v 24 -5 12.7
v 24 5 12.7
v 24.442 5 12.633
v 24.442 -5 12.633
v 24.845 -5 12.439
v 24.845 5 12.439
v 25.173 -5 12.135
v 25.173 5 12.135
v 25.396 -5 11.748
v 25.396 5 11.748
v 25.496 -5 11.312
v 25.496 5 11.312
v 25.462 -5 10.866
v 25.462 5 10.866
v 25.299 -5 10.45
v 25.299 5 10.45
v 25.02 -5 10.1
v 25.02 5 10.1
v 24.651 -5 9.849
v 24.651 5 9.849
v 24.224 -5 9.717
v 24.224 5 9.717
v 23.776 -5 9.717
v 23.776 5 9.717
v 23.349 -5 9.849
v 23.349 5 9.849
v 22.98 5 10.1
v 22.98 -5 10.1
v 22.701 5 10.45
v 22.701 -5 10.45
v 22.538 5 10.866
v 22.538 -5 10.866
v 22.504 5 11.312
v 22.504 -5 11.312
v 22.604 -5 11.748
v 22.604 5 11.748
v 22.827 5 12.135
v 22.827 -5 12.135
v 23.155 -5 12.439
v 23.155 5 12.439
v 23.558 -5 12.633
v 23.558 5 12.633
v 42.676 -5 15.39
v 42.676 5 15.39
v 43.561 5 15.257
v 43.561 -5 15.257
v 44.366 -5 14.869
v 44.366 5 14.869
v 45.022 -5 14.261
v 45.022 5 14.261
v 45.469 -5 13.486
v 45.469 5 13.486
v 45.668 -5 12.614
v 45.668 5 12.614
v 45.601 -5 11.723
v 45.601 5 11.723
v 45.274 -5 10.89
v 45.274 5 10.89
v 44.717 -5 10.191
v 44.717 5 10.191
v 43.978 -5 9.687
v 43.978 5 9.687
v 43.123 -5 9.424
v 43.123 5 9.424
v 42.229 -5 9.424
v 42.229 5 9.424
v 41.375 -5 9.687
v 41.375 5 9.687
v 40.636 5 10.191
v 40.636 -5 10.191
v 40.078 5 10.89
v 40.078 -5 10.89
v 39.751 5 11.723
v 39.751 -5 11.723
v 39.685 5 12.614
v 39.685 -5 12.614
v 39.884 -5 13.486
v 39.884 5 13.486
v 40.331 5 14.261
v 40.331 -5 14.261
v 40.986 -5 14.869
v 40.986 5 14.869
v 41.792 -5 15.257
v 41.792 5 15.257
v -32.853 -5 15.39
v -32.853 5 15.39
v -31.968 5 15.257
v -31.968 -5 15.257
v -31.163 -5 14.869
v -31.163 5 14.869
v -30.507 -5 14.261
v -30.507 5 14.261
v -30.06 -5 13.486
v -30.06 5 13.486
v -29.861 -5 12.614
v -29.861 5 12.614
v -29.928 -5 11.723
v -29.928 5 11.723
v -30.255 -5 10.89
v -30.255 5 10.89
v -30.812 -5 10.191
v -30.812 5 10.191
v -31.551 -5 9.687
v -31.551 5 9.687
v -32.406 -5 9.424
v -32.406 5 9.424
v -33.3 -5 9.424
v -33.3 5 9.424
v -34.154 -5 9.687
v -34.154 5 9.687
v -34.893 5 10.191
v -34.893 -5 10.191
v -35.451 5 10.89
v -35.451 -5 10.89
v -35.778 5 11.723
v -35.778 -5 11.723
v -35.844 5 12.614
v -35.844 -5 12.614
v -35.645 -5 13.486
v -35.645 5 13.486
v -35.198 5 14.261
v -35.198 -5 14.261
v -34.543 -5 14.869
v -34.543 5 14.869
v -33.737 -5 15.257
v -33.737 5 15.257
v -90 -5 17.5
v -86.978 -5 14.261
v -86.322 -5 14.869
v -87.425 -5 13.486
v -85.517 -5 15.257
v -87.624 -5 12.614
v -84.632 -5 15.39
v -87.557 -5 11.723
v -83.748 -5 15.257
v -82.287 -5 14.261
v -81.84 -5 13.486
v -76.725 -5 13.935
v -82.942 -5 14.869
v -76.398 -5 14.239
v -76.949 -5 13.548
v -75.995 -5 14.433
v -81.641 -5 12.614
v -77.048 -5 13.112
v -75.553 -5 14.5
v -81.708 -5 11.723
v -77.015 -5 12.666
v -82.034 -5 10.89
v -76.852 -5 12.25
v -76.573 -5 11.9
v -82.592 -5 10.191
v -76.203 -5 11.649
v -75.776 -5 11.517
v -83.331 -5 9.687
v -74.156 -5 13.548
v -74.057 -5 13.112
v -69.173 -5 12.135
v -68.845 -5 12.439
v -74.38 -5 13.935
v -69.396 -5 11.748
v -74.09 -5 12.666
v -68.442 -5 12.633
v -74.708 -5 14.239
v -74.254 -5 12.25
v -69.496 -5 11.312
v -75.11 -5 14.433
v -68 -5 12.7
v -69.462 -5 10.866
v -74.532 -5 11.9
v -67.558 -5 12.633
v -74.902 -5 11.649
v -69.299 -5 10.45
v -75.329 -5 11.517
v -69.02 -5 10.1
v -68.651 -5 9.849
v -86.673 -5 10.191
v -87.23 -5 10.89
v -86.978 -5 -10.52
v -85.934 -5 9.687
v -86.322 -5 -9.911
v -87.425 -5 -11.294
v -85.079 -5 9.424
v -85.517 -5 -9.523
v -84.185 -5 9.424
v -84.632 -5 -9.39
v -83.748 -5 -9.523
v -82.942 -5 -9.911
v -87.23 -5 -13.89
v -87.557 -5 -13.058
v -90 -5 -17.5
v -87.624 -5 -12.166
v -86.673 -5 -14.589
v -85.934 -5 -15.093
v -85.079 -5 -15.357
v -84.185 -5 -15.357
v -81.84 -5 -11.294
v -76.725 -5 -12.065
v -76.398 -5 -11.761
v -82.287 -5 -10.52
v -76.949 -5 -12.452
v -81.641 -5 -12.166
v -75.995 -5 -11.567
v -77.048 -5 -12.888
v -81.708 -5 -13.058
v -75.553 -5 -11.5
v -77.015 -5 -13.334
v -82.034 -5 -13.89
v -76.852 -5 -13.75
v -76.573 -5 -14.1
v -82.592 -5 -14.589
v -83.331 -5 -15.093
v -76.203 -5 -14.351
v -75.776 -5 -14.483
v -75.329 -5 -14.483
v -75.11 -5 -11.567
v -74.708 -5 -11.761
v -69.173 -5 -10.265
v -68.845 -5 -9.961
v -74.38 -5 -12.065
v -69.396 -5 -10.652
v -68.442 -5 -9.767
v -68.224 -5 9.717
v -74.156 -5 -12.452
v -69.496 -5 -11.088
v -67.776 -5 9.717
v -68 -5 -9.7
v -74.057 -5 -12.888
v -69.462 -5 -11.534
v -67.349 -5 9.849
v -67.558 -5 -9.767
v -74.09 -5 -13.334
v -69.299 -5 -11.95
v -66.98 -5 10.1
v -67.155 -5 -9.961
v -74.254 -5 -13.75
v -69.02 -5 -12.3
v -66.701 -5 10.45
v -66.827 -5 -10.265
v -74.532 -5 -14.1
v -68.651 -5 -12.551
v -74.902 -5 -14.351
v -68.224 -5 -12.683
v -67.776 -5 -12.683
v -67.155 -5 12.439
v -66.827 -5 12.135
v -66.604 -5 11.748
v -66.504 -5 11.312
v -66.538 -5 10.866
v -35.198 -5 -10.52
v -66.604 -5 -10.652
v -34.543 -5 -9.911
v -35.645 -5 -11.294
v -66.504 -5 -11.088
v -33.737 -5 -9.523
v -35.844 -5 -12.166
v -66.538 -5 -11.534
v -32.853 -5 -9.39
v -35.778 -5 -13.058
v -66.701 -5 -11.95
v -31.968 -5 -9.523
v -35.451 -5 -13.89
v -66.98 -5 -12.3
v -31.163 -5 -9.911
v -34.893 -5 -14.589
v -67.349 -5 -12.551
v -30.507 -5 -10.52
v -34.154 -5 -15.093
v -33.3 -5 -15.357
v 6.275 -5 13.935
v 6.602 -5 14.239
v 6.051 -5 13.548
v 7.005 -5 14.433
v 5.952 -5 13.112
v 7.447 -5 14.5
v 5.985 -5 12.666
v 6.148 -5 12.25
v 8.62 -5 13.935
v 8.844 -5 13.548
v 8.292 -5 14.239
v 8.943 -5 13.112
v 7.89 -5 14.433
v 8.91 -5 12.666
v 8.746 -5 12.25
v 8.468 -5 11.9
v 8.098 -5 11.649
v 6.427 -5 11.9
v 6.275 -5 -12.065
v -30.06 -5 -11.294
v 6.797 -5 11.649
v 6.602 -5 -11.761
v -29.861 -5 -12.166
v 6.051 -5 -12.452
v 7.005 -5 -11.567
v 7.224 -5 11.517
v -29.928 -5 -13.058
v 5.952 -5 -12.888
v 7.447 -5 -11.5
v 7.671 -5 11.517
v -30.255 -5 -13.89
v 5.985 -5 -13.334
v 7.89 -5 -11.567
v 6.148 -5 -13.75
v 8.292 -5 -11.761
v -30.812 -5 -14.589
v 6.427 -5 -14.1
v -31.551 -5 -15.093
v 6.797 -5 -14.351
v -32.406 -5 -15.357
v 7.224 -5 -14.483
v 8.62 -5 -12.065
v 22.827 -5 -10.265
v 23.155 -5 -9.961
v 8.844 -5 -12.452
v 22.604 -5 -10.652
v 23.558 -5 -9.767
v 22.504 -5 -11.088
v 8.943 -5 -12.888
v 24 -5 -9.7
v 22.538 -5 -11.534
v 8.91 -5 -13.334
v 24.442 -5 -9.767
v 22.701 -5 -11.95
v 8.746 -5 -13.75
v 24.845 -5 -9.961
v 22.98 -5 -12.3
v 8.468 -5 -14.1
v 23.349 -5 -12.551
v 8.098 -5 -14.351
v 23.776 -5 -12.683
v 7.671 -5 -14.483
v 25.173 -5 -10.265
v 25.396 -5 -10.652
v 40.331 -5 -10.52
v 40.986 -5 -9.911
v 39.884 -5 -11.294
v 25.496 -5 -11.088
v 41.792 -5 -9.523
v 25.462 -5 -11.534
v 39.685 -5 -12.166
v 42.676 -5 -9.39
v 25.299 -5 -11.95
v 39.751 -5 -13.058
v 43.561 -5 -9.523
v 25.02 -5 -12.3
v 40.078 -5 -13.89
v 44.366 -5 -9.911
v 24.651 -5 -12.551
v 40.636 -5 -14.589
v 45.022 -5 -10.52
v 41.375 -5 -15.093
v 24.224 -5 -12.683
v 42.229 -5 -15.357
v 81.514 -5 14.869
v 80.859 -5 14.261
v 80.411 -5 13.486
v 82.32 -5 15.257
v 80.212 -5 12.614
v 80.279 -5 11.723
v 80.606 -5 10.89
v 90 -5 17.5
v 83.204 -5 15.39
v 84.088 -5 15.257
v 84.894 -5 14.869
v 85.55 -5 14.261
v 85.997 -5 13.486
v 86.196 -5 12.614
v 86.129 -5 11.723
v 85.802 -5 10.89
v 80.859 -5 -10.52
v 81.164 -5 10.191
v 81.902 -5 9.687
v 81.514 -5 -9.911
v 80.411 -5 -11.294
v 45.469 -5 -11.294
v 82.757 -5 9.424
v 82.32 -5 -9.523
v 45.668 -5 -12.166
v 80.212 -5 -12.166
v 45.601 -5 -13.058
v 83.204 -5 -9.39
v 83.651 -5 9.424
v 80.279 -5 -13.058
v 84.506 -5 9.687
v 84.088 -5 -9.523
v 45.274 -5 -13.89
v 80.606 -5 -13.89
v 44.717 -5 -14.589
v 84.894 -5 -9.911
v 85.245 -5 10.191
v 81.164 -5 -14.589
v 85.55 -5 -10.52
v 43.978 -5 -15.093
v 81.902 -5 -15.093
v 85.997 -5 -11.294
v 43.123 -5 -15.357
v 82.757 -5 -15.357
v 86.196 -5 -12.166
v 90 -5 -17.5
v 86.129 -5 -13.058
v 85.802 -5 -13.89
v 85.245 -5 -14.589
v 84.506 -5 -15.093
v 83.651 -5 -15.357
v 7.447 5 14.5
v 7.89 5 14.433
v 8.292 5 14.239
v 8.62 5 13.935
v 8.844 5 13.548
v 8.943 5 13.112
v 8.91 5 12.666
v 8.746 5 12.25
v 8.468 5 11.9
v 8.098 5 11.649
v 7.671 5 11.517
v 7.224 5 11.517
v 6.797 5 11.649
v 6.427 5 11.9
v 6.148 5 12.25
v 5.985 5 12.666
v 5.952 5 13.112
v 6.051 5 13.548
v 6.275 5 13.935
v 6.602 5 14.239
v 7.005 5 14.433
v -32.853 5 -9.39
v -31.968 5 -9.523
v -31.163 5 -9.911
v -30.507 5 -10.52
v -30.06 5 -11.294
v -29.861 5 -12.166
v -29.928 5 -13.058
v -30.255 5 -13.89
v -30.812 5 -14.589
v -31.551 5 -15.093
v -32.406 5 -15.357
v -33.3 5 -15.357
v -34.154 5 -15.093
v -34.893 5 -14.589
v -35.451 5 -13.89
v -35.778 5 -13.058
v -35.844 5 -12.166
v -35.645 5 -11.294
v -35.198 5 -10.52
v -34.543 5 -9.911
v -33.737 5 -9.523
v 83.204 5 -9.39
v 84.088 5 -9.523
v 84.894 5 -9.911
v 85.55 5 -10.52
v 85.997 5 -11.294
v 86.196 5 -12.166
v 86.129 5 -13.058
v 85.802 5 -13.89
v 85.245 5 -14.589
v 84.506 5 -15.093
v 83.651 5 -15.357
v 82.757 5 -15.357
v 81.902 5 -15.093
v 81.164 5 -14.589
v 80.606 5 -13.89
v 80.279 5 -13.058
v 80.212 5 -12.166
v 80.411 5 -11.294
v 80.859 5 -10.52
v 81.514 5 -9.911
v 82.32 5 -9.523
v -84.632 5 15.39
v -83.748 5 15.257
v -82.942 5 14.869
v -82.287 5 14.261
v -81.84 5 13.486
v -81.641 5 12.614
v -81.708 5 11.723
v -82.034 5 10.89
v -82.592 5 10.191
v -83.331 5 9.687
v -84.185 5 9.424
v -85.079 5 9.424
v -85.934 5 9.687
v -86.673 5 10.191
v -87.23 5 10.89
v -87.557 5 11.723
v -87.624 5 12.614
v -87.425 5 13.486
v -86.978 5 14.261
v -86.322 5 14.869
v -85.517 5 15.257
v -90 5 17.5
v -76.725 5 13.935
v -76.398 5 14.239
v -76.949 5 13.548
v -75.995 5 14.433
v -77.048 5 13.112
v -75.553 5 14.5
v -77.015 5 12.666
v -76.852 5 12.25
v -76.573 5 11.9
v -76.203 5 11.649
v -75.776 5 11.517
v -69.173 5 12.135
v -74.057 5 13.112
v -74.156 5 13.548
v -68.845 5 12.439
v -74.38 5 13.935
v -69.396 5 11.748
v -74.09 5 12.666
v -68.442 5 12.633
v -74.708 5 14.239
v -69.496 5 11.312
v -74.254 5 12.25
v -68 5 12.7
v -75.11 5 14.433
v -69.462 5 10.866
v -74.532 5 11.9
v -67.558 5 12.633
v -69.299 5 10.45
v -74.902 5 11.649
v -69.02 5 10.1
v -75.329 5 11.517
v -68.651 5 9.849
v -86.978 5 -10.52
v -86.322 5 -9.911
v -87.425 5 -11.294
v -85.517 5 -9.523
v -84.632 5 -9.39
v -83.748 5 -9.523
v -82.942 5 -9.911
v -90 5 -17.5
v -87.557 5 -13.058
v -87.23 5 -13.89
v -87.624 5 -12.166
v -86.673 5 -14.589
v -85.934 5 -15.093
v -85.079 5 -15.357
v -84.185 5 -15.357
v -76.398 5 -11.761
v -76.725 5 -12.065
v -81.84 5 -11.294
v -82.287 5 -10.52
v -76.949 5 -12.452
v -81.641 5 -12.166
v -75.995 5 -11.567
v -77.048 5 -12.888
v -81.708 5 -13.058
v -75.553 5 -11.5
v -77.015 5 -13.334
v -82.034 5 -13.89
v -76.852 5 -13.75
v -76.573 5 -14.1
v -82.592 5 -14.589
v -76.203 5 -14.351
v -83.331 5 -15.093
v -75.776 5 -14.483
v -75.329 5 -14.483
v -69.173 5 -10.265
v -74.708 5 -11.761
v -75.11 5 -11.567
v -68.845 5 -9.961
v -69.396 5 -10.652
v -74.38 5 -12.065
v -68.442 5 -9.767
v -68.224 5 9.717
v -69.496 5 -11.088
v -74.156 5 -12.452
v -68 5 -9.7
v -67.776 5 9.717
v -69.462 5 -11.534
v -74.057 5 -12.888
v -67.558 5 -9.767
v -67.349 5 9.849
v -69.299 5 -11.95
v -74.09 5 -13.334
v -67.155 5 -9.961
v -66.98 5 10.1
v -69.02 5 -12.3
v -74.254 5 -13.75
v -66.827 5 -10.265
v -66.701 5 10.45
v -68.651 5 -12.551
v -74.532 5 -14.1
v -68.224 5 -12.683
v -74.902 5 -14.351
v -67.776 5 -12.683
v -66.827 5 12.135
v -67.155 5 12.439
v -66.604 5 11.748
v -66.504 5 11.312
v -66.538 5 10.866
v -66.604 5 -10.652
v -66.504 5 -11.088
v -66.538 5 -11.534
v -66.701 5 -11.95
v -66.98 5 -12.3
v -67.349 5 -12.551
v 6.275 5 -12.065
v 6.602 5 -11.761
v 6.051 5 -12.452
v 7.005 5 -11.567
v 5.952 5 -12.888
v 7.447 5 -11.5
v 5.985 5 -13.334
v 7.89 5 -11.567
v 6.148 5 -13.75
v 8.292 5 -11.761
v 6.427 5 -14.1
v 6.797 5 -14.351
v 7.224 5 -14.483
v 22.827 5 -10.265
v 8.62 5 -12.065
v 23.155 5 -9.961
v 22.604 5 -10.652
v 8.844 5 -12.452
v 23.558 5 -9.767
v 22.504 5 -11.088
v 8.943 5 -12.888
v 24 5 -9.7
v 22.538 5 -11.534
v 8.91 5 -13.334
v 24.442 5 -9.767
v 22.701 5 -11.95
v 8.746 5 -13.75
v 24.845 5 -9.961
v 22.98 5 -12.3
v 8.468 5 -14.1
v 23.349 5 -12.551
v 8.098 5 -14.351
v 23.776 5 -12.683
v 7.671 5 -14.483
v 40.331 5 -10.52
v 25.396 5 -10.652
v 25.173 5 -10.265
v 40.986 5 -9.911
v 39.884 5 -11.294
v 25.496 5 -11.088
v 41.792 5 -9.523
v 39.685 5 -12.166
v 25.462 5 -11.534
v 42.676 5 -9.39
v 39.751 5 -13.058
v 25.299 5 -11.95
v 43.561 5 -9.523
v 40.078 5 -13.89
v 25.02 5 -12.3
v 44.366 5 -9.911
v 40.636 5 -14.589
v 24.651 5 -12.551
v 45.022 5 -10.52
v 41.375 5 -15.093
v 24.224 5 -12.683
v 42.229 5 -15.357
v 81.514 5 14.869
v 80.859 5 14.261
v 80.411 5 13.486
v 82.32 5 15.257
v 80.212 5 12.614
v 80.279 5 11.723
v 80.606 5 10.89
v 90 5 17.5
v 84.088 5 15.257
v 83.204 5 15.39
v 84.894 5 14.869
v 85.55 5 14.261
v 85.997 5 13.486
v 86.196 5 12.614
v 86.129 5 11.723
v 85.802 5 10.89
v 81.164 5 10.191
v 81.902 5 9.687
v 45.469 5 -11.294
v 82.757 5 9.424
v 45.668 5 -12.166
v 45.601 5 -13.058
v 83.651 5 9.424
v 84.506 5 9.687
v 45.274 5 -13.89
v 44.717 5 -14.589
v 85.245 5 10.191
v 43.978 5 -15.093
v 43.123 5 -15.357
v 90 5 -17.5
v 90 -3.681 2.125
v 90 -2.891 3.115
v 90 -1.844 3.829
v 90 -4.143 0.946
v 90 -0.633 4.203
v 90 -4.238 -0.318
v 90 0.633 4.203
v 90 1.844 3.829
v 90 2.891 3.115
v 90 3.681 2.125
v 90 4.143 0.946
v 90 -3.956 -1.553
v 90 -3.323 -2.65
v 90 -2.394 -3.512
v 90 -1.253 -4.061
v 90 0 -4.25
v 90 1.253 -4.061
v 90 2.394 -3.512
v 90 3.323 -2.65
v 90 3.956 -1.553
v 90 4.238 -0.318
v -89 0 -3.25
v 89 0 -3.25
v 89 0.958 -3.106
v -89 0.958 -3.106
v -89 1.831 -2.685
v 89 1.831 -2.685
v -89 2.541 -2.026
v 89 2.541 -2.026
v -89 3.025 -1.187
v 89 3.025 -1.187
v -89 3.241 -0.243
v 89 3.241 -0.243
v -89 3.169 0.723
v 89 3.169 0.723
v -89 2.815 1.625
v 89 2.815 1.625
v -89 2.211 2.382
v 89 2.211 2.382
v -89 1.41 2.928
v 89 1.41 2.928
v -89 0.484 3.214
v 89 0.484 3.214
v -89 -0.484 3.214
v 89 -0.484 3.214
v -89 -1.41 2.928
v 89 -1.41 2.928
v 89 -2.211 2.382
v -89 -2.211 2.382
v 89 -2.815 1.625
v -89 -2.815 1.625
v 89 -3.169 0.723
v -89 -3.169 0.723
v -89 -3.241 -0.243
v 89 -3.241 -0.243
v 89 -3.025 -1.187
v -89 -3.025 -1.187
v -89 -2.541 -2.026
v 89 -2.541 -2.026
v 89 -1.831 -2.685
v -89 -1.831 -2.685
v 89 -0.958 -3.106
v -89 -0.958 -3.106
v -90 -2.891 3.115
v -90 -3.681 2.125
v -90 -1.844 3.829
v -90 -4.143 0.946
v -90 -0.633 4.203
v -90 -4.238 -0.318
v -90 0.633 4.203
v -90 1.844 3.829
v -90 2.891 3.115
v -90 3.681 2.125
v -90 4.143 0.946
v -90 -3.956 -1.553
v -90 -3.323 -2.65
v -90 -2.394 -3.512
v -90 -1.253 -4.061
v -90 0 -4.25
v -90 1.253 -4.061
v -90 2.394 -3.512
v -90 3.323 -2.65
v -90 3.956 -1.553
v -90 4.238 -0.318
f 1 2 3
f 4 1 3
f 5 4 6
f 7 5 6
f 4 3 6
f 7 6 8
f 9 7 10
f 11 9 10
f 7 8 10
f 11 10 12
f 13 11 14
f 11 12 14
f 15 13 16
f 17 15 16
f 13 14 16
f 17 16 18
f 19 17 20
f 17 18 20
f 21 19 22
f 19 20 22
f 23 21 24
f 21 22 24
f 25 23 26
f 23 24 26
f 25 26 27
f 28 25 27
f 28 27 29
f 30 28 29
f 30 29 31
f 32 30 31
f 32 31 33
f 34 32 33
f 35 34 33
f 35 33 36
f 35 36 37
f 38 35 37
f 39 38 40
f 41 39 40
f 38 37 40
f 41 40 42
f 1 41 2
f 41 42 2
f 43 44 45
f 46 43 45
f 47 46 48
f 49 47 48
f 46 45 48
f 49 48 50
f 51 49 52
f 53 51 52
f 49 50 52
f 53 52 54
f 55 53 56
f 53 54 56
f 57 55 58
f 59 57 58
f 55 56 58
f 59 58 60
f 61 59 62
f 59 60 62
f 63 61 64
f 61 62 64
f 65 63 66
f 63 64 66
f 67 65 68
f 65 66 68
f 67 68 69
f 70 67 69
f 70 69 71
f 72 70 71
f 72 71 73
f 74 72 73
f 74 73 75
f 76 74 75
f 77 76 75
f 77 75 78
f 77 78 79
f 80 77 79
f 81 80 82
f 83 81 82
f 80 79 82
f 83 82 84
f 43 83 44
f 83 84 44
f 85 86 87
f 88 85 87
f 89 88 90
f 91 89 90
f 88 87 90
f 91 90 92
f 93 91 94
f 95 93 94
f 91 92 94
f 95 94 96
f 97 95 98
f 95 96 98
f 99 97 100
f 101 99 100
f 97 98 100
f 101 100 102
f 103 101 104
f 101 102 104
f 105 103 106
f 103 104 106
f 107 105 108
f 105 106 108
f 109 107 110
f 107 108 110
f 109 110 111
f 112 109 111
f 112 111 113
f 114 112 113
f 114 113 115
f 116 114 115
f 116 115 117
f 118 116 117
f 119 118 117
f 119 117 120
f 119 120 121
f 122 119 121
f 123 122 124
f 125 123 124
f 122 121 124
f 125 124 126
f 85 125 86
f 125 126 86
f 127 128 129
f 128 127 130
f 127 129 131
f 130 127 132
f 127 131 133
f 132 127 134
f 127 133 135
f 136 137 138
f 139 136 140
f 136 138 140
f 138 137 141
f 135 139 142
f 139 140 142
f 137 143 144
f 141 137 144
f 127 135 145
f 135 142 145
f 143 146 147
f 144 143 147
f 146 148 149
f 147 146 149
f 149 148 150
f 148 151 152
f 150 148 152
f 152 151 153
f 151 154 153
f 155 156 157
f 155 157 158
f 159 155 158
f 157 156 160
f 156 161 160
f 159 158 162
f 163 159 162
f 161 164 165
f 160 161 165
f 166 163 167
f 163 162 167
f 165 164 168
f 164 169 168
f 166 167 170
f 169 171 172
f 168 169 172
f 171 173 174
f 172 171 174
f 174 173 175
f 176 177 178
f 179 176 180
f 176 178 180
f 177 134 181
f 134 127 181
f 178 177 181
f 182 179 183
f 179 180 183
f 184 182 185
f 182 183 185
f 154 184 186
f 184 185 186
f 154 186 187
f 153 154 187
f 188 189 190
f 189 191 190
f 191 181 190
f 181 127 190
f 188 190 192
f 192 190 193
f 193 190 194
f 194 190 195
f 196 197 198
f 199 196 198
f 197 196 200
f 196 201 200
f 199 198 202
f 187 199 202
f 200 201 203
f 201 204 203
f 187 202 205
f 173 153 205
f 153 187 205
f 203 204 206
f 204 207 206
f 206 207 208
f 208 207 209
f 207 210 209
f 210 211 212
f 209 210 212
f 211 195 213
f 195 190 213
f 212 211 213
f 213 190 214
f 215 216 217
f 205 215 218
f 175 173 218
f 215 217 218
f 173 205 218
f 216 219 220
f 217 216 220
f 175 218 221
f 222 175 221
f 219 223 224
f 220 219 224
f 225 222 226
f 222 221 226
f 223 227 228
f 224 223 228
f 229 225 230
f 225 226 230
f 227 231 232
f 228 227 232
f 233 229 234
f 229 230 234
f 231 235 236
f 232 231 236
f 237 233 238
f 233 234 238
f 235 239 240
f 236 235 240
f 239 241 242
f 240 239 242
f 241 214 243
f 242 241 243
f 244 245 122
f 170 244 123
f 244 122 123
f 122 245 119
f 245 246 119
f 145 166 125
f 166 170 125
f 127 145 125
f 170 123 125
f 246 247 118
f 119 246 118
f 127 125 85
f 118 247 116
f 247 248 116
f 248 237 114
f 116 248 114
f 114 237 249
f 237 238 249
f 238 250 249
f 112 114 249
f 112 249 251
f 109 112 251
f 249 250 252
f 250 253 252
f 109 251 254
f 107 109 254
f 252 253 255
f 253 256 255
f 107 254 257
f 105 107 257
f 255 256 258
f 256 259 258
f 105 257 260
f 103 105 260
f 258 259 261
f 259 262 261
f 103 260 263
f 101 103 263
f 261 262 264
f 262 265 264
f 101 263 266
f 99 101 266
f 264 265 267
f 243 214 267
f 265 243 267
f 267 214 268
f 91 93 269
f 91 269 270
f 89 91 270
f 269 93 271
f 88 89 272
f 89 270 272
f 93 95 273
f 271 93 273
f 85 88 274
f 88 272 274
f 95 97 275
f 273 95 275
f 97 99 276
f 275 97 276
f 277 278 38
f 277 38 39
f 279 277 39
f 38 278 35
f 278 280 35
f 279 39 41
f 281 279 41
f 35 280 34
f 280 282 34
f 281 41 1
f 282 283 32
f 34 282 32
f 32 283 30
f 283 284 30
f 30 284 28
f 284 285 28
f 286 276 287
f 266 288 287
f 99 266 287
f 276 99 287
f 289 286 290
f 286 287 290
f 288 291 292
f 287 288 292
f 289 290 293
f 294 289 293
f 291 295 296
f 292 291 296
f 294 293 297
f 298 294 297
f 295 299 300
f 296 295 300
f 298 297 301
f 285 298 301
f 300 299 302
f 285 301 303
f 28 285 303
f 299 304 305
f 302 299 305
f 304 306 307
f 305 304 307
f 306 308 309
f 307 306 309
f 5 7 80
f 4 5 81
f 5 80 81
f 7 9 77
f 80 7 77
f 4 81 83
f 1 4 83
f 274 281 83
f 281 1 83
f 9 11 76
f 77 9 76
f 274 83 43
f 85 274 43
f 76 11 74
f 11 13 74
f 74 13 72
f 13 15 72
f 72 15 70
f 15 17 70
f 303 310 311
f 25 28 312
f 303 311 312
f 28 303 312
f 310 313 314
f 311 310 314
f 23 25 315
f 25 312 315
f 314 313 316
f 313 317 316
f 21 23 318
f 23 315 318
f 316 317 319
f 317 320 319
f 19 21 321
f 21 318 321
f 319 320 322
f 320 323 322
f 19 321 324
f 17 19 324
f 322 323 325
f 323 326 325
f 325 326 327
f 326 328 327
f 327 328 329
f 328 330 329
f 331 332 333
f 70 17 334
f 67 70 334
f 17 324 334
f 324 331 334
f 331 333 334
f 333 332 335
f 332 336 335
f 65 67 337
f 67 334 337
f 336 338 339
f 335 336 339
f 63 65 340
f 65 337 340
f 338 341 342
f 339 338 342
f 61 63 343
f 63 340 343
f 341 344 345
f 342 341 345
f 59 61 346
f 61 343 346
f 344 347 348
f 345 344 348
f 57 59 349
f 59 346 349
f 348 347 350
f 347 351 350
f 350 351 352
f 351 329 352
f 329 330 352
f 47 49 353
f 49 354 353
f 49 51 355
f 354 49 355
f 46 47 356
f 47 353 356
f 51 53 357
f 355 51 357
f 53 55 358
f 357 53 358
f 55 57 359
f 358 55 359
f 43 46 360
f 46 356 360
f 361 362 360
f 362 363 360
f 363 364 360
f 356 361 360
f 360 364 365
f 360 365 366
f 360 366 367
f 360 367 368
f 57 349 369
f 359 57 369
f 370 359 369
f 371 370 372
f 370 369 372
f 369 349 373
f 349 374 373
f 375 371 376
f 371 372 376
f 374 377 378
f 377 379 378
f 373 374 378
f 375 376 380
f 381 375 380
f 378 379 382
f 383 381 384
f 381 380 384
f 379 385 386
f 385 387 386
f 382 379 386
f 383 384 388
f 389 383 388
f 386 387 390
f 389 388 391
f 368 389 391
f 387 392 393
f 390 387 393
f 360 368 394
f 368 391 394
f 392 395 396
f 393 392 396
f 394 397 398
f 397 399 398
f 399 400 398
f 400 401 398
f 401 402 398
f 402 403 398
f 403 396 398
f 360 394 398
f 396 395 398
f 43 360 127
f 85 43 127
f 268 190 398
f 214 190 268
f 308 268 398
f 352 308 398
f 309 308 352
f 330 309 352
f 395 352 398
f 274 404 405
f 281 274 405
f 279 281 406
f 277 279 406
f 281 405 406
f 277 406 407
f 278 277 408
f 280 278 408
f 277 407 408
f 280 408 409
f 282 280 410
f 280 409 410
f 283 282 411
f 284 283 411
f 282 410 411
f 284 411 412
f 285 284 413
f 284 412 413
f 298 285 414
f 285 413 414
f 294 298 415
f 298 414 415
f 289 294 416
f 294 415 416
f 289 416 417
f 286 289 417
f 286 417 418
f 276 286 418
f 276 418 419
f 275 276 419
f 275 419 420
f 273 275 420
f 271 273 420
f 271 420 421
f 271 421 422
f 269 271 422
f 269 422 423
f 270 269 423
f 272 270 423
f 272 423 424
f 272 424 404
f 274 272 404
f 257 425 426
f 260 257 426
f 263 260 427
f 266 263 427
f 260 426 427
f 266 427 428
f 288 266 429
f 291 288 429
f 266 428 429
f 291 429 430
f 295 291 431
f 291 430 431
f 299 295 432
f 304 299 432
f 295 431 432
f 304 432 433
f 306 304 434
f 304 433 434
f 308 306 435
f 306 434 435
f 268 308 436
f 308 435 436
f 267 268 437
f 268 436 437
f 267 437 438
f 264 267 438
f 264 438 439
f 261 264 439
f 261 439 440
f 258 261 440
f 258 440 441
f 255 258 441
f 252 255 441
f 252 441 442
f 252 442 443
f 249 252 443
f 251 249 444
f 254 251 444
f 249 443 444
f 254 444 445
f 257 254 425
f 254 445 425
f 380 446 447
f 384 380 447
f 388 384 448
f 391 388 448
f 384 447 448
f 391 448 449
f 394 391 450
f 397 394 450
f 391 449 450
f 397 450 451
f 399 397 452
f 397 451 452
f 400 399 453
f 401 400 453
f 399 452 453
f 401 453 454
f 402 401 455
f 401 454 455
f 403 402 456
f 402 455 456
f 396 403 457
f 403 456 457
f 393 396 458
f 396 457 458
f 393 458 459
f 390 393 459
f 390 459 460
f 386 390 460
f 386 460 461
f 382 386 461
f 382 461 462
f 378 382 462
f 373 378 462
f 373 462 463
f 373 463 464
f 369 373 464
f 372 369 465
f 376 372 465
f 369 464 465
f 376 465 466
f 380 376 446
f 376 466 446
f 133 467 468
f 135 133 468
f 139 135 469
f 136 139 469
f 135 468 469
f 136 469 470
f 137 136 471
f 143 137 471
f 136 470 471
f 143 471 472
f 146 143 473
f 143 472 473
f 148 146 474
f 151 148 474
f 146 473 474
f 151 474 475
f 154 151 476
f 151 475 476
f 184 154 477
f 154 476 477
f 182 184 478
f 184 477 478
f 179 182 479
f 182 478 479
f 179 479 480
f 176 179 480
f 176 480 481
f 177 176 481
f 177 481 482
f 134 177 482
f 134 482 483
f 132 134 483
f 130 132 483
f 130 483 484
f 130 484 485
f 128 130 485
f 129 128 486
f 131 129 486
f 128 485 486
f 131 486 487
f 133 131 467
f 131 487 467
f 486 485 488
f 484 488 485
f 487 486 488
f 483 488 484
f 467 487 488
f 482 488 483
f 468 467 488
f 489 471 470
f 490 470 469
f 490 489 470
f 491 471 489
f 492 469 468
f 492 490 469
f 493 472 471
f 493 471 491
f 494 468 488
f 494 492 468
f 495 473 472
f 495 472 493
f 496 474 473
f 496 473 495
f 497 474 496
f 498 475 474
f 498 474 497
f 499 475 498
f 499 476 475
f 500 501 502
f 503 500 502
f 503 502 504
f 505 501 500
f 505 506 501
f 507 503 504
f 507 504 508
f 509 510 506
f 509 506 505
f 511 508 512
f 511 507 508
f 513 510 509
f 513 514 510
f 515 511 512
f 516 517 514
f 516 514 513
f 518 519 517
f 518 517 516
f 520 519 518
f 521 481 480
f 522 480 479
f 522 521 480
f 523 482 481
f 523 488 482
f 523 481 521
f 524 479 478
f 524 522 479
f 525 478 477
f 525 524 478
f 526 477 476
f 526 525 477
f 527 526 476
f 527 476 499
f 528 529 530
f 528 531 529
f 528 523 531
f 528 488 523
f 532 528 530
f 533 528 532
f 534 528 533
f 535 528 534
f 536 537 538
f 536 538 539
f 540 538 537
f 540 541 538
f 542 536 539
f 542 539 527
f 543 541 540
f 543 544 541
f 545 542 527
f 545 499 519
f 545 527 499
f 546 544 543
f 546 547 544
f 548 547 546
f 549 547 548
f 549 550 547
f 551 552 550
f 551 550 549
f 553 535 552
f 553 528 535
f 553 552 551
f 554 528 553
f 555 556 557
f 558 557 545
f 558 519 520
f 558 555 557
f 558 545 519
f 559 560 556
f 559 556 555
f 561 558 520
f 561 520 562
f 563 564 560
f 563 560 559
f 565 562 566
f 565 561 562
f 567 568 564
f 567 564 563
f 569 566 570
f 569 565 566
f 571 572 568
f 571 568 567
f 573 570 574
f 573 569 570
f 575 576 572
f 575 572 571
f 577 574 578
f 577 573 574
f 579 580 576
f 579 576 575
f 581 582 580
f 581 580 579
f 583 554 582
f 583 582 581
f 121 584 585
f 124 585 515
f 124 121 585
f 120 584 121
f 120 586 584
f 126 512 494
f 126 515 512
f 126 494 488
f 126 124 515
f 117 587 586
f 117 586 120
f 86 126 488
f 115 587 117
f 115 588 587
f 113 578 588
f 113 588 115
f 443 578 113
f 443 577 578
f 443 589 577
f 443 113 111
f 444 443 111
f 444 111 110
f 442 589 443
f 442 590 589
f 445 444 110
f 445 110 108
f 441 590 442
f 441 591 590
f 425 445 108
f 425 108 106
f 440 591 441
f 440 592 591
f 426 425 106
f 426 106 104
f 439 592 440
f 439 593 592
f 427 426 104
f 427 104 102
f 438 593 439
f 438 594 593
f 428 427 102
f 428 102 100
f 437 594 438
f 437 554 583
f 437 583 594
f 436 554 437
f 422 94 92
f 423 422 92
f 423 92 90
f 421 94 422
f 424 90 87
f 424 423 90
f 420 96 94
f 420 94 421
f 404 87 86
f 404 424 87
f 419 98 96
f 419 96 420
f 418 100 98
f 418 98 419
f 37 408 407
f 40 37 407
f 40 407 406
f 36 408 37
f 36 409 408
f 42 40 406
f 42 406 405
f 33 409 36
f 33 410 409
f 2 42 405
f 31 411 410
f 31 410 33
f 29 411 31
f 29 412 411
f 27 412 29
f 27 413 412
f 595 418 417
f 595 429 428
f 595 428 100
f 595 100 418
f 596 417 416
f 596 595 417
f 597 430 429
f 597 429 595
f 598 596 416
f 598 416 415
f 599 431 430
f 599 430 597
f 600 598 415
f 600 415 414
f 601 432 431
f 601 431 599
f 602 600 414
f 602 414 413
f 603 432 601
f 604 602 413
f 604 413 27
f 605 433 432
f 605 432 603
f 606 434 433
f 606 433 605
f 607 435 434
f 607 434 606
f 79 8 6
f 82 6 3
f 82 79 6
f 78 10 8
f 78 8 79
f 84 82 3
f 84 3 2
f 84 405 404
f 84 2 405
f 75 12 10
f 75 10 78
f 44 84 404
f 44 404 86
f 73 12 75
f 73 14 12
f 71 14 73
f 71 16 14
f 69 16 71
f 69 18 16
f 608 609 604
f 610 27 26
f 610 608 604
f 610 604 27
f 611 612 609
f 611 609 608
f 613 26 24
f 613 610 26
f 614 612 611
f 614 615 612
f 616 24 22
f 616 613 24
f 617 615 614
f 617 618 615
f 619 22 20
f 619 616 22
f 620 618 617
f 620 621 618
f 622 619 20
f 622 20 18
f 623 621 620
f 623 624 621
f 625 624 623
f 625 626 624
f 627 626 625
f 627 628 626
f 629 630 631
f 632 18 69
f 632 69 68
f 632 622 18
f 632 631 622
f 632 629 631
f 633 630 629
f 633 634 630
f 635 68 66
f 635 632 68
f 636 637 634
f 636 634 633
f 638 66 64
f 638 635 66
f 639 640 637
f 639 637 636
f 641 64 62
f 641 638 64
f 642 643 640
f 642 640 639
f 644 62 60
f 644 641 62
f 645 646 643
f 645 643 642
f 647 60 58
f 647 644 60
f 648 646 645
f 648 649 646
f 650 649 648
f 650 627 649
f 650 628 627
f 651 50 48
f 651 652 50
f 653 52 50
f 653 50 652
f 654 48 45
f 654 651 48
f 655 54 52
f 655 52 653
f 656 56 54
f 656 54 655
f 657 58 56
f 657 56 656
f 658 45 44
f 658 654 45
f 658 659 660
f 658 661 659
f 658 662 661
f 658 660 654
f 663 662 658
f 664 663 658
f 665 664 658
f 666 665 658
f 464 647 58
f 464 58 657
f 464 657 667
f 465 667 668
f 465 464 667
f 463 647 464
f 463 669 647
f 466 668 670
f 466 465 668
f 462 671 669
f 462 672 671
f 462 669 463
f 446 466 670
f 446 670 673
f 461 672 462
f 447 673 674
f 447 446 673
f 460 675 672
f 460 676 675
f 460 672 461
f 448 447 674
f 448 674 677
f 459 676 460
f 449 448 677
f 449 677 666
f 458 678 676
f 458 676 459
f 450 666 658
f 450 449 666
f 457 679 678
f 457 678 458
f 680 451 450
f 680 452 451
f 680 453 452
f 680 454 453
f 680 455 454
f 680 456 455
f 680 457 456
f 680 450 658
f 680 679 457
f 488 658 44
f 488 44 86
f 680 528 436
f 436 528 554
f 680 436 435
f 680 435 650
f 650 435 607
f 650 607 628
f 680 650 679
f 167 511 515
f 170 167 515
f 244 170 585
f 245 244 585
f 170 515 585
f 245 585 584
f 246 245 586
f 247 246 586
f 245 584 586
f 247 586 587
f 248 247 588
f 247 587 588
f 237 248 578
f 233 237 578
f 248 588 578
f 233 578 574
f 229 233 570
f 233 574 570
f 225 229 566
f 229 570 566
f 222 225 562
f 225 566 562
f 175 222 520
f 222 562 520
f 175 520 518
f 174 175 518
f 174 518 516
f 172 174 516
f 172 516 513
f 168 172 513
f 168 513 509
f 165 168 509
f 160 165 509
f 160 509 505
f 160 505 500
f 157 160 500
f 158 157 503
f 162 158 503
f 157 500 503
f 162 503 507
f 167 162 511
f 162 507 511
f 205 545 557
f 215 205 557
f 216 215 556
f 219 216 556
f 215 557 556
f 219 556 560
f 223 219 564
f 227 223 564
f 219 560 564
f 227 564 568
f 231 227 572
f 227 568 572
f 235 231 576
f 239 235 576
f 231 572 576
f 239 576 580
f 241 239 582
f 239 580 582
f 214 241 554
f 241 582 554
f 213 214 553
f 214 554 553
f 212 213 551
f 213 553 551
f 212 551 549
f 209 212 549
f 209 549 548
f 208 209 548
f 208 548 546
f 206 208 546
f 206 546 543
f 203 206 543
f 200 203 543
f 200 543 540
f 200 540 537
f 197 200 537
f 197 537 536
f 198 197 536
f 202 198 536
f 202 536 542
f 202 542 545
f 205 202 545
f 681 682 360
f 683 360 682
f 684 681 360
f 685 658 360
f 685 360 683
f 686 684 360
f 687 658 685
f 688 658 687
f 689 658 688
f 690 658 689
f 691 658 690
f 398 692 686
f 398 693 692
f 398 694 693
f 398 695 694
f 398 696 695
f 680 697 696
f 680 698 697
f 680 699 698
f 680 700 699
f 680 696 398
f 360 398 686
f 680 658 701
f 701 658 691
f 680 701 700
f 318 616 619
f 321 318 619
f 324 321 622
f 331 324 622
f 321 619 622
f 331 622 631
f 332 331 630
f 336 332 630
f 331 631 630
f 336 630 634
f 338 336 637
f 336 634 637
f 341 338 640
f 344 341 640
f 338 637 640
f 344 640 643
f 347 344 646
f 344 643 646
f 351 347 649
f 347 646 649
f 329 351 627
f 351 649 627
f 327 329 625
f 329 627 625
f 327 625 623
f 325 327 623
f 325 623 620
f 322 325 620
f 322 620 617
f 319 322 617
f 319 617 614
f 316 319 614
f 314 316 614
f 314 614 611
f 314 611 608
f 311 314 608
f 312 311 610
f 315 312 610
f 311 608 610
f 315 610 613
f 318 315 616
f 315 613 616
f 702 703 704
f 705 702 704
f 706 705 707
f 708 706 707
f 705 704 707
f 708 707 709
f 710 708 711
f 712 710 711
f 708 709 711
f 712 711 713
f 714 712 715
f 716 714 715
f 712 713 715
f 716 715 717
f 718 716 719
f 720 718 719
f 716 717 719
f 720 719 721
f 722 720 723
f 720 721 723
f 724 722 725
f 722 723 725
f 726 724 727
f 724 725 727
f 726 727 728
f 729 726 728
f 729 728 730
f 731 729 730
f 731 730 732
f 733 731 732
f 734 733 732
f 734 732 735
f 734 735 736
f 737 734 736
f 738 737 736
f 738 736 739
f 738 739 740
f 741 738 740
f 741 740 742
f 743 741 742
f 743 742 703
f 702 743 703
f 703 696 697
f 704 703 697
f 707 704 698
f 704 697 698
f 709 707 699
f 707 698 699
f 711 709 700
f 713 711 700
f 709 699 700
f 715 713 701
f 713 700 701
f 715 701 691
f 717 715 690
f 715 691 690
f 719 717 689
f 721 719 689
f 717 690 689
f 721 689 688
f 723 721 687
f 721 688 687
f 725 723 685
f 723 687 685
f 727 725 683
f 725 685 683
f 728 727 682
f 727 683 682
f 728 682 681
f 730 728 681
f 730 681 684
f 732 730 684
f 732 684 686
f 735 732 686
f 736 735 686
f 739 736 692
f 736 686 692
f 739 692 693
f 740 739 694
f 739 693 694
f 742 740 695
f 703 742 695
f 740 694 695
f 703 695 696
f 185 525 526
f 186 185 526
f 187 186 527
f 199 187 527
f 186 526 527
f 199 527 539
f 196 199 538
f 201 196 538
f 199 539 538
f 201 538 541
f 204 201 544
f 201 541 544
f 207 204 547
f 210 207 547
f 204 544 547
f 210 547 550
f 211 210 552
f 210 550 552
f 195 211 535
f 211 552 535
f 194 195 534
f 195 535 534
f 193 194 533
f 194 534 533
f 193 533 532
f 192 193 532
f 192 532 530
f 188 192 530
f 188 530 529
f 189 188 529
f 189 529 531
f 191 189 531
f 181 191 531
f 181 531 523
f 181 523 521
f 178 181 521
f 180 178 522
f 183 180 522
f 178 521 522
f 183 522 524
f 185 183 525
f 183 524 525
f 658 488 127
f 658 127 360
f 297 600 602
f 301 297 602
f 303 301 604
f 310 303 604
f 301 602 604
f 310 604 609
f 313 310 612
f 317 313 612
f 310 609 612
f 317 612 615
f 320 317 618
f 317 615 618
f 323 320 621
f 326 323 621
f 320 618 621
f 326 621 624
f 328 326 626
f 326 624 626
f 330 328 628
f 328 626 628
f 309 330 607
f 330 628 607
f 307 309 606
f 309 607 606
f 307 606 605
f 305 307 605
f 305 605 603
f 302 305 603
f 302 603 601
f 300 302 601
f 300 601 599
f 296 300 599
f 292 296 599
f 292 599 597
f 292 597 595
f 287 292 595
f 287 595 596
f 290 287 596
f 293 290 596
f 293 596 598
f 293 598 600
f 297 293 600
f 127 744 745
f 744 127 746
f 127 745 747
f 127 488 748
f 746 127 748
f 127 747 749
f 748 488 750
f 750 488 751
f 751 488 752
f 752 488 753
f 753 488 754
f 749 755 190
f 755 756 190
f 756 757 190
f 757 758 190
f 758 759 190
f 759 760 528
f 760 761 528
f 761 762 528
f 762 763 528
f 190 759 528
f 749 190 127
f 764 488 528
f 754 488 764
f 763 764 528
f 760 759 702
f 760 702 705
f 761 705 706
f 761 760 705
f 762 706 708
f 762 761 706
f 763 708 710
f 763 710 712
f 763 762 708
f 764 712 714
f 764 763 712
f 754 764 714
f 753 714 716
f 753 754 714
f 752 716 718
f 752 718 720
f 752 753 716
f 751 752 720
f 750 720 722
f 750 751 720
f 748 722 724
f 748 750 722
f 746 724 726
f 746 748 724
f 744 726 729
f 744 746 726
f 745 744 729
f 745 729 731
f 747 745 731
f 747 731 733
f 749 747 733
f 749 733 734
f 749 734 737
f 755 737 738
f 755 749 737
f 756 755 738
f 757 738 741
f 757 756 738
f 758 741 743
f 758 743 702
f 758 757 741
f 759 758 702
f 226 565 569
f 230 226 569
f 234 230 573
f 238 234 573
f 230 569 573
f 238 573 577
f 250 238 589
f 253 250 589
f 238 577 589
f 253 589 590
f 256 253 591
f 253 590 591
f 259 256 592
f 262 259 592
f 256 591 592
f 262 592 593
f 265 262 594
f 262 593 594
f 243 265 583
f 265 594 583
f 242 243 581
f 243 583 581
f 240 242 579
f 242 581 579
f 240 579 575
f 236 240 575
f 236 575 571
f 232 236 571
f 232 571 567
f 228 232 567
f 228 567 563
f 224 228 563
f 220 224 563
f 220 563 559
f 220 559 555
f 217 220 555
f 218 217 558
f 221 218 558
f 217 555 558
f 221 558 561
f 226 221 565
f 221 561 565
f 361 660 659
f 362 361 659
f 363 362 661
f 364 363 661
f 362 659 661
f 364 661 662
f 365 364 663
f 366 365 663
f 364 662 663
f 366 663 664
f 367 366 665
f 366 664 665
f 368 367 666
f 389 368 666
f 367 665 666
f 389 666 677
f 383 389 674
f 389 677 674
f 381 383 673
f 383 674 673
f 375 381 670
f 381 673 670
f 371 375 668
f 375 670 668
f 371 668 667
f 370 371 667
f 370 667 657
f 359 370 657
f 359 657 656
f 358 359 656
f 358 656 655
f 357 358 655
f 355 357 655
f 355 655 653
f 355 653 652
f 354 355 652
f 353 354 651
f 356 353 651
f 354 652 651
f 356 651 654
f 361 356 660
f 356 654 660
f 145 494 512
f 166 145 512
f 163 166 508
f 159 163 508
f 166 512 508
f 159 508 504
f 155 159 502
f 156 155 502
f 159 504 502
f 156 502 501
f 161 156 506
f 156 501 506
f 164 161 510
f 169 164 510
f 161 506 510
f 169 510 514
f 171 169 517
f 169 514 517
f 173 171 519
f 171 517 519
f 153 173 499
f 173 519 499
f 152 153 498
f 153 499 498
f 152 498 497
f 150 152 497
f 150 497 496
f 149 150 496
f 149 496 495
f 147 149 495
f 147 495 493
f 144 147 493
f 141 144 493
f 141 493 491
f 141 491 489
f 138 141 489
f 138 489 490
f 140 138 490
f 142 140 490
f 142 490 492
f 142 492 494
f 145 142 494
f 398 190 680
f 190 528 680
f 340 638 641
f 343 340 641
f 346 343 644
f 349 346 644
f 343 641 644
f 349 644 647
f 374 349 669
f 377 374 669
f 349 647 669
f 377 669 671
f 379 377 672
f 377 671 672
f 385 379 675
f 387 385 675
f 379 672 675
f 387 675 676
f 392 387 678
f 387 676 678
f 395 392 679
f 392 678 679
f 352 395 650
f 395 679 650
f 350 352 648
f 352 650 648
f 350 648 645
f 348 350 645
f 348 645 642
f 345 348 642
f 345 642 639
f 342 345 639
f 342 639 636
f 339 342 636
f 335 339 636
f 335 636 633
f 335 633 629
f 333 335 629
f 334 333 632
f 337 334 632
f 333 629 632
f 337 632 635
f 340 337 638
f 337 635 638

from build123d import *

# Parameters (mm, degrees)
SKETCH1_W           = 180
SKETCH1_H           = 35
BOSS_EXTRUDE1_DEPTH = 5
SKETCH3_R           = 3.25
CUT_EXTRUDE1_DEPTH  = 181.917799014
CHAMFER1_SIZE       = 1
CHAMFER2_SIZE       = 1
SKETCH5_R           = 1.5
CUT_EXTRUDE2_DEPTH  = 10
SKETCH18_R          = 1.5
CUT_EXTRUDE3_DEPTH  = 36
SKETCH19_R          = 3
CUT_EXTRUDE4_DEPTH  = 10


with BuildPart() as part:
    # Sketch1 → Boss-Extrude1 (new, symmetric)
    with BuildSketch(Plane(origin=(0, 0, 0), x_dir=(1, 0, 0), z_dir=(0, 1, 0))):
        Rectangle(SKETCH1_W, SKETCH1_H)
    extrude(amount=BOSS_EXTRUDE1_DEPTH, both=True)

    # Sketch3 → Cut-Extrude1 (cut, through all)
    with BuildSketch(Plane(origin=(90, 0, 0), x_dir=(0, 0, -1), z_dir=(1, 0, 0))):
        Circle(SKETCH3_R)
    extrude(amount=-CUT_EXTRUDE1_DEPTH, mode=Mode.SUBTRACT)

    # Chamfer1
    chamfer1_edges = [part.edges().sort_by_distance(p)[0] for p in [
        (90, 0, 3.25),
    ]]
    chamfer(chamfer1_edges, length=CHAMFER1_SIZE)

    # Chamfer2
    chamfer2_edges = [part.edges().sort_by_distance(p)[0] for p in [
        (-90, 0, 3.25),
    ]]
    chamfer(chamfer2_edges, length=CHAMFER2_SIZE)

    # Sketch5 → Cut-Extrude2 (cut)
    with BuildSketch(Plane(origin=(0, 5, 0), x_dir=(1, 0, 0), z_dir=(0, 1, 0))):
        with Locations(Location((-68, -11.2, 0), (0, 0, 270))):
            Circle(SKETCH5_R)
        with Locations(Location((-68, 11.2, 0), (0, 0, 270))):
            Circle(SKETCH5_R)
        with Locations(Location((24, 11.2, 0), (0, 0, 270))):
            Circle(SKETCH5_R)
        with Locations(Location((24, -11.2, 0), (0, 0, 270))):
            Circle(SKETCH5_R)
    extrude(amount=-CUT_EXTRUDE2_DEPTH, mode=Mode.SUBTRACT)

    # Sketch18 → Cut-Extrude3 (cut)
    with BuildSketch(Plane(origin=(0, 5, 0), x_dir=(1, 0, 0), z_dir=(0, 1, 0))):
        with Locations(Location((-75.552597146, 13, 0), (0, 0, 270))):
            Circle(SKETCH18_R)
        with Locations(Location((-75.552597146, -13, 0), (0, 0, 270))):
            Circle(SKETCH18_R)
        with Locations(Location((7.447402854, -13, 0), (0, 0, 270))):
            Circle(SKETCH18_R)
        with Locations(Location((7.447402854, 13, 0), (0, 0, 270))):
            Circle(SKETCH18_R)
    extrude(amount=-CUT_EXTRUDE3_DEPTH, mode=Mode.SUBTRACT)

    # Sketch19 → Cut-Extrude4 (cut)
    with BuildSketch(Plane(origin=(0, 5, 0), x_dir=(1, 0, 0), z_dir=(0, 1, 0))):
        with Locations(Location((-84.632352591, 12.390150385, 0), (0, 0, 270))):
            Circle(SKETCH19_R)
        with Locations(Location((-84.632352591, -12.390150385, 0), (0, 0, 270))):
            Circle(SKETCH19_R)
        with Locations(Location((83.204027378, 12.390150385, 0), (0, 0, 270))):
            Circle(SKETCH19_R)
        with Locations(Location((83.204027378, -12.390150385, 0), (0, 0, 270))):
            Circle(SKETCH19_R)
        with Locations(Location((42.676245092, -12.390150385, 0), (0, 0, 270))):
            Circle(SKETCH19_R)
        with Locations(Location((42.676245092, 12.390150385, 0), (0, 0, 270))):
            Circle(SKETCH19_R)
        with Locations(Location((-32.852727664, -12.390150385, 0), (0, 0, 270))):
            Circle(SKETCH19_R)
        with Locations(Location((-32.852727664, 12.390150385, 0), (0, 0, 270))):
            Circle(SKETCH19_R)
    extrude(amount=-CUT_EXTRUDE4_DEPTH, mode=Mode.SUBTRACT)


solid = part.part
